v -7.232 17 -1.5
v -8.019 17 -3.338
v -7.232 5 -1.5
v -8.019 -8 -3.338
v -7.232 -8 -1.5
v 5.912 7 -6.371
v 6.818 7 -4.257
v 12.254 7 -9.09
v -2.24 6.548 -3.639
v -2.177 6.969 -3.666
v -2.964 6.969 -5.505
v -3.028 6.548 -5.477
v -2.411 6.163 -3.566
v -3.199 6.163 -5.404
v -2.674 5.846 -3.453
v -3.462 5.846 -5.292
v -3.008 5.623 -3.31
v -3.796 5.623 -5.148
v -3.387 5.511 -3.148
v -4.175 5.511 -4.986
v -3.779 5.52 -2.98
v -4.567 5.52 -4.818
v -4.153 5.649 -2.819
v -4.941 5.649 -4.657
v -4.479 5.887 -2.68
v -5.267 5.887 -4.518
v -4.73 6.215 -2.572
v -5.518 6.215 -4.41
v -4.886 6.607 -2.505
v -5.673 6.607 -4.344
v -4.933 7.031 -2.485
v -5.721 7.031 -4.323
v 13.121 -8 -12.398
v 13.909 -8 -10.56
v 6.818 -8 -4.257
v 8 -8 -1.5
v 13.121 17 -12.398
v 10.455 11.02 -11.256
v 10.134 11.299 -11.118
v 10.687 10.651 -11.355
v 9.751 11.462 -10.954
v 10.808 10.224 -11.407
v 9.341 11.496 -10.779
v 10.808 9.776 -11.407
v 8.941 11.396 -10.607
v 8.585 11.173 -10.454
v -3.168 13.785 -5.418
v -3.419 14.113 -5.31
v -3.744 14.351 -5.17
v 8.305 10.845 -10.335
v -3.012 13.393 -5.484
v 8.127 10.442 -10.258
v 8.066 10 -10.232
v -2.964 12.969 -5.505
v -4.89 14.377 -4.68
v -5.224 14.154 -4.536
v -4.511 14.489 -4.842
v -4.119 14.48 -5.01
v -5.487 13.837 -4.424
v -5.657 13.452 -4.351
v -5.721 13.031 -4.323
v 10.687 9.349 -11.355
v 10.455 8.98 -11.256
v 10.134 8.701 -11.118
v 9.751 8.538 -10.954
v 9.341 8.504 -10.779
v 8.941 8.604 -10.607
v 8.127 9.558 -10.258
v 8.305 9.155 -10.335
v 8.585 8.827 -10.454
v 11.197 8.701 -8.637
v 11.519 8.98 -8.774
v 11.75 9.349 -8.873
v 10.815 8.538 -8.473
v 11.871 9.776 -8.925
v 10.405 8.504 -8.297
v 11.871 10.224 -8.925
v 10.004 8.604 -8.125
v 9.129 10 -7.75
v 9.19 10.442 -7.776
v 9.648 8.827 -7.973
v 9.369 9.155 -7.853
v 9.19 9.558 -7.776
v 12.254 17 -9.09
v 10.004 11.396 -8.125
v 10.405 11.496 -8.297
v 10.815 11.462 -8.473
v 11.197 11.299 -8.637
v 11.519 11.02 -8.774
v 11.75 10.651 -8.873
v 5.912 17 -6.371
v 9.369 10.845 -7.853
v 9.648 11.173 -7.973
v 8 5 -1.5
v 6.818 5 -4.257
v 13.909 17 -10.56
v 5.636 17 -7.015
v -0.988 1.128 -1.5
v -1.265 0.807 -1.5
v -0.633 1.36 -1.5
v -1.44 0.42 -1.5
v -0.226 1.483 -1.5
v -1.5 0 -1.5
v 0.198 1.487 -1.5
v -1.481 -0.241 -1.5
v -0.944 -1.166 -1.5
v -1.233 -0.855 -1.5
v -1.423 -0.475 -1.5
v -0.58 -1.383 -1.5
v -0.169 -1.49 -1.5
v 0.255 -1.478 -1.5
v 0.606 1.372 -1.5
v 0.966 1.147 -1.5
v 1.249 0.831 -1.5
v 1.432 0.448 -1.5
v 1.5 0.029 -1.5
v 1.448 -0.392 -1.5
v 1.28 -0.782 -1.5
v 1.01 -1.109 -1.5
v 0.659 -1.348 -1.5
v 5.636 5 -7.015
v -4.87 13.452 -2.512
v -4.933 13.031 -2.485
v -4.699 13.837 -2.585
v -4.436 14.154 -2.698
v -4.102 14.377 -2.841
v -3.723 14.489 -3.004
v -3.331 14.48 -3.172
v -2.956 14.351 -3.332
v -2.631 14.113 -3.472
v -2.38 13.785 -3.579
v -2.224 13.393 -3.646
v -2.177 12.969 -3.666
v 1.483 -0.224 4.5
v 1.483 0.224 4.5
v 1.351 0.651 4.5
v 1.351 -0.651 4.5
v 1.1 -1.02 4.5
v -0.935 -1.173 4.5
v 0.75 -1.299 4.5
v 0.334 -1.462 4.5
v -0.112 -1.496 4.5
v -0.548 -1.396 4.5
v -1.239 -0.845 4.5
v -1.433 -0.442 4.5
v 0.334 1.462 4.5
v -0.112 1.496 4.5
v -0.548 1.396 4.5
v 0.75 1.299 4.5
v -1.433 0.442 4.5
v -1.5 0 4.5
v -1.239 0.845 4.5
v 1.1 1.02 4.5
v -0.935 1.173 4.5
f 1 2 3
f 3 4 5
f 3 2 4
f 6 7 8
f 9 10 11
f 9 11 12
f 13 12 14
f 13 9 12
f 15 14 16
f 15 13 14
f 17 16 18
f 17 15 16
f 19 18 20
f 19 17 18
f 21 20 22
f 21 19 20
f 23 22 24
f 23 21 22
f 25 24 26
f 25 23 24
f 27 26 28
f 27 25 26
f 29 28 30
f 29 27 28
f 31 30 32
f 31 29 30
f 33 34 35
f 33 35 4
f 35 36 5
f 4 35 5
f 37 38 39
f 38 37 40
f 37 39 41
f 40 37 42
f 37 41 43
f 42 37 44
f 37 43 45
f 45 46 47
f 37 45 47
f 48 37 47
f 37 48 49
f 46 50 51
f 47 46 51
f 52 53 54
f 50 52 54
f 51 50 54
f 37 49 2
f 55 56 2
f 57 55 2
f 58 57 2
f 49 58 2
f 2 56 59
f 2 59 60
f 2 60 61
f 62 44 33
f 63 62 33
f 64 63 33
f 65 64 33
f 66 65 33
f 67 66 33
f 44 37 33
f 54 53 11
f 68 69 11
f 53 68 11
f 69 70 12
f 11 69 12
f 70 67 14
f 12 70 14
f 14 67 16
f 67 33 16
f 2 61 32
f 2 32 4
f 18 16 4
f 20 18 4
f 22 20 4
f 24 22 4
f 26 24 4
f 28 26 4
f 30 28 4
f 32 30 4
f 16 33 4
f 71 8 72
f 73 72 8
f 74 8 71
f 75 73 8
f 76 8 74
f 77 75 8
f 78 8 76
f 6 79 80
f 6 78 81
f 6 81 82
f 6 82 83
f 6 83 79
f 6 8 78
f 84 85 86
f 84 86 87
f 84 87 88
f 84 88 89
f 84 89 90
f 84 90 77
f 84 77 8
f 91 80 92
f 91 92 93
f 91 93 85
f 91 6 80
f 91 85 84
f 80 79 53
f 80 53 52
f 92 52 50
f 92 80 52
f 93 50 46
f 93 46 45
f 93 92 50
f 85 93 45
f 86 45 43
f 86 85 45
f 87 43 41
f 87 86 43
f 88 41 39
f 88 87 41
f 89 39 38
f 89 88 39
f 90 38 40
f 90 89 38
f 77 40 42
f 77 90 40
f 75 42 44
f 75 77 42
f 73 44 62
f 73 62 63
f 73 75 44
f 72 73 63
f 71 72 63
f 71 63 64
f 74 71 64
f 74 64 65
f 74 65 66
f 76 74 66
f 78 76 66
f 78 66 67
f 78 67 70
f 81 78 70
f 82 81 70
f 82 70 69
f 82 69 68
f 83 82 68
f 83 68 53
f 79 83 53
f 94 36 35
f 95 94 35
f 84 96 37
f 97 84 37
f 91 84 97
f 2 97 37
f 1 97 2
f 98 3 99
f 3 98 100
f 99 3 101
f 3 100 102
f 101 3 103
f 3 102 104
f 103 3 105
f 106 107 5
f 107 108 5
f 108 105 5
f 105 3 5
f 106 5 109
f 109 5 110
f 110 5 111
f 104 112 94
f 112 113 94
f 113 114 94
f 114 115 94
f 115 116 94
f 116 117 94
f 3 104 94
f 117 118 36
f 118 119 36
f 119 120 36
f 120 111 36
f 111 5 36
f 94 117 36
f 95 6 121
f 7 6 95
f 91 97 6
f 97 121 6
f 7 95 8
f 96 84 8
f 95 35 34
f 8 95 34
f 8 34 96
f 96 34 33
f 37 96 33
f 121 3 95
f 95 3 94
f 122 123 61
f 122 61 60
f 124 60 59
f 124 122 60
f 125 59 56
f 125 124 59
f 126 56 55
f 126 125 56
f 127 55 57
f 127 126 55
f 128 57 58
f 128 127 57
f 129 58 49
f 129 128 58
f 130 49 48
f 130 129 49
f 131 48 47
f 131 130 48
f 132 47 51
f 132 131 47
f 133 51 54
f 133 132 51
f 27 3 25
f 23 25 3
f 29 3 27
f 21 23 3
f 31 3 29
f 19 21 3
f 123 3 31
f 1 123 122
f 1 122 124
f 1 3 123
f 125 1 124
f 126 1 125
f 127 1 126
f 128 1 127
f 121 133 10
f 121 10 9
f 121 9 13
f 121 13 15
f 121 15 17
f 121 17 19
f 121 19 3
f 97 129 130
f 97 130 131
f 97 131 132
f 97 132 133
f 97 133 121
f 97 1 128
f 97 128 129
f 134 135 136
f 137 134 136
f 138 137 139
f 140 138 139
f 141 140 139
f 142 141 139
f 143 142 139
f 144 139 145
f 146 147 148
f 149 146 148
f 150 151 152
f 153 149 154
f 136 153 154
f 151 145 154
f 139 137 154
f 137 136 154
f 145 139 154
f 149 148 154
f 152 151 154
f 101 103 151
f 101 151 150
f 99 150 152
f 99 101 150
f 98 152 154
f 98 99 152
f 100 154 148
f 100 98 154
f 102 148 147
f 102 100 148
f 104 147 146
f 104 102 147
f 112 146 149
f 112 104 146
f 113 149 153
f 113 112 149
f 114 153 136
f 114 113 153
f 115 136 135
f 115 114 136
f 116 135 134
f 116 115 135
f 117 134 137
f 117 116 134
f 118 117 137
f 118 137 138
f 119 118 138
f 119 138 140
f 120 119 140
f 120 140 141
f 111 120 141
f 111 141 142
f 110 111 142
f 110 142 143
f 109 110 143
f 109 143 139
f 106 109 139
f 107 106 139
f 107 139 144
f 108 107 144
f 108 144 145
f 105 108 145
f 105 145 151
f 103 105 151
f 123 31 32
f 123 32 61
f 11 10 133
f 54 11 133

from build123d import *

# Parameters (mm, degrees)
PAD_DEPTH                      = 25
POCKET_DEPTH                   = 12
SKETCH002_R                    = 1.5
PAD001_DEPTH                   = 6
POCKET001_DEPTH                = 2.001
SKETCH004_W                    = 2.3
SKETCH004_H                    = 10
POCKET002_DEPTH                = 9.001
SKETCH005_R                    = 1.5
HOLE_DEPTH                     = 2.701
PART_MIRRORING_PLACEMENT_ANGLE = 23.19859


with BuildPart() as body:
    # Sketch → Pad (new body)
    with BuildSketch(Plane.XZ):
        Polygon((0, 0), (0, 2), (14, 8), (14, 5), (23, 2), (23, 0), align=None)
    extrude(amount=PAD_DEPTH)

    # Sketch001 (on Face8 of Pad) → Pocket (cut)
    with BuildSketch(Plane.XZ.offset(25)):
        Polygon((0, 2), (14, 2), (14, 8), align=None)
    extrude(amount=-POCKET_DEPTH, mode=Mode.SUBTRACT)

    # Sketch002 (on Face3 of Pocket) → Pad001 (join)
    with BuildSketch(Plane(origin=(-0.724138, 0, 1.689655), x_dir=(-0.919145, 0, -0.393919), z_dir=(-0.393919, 0, 0.919145))):
        with Locations((-8.019385, 8)):
            Circle(SKETCH002_R)
    extrude(amount=PAD001_DEPTH)

    # Sketch003 (on Face4 of Pad001) → Pocket001 (cut, through all)
    with BuildSketch(Plane(origin=(0, 0, 2), x_dir=(-1, 0, 0), z_dir=(0, 0, 1))):
        with BuildLine():
            ThreePointArc((-2.500319, 21.030919), (-4.030919, 22.499681), (-5.499681, 20.969081))
            Line((-5.499681, 14.969081), (-5.499681, 20.969081))
            ThreePointArc((-5.499681, 14.969081), (-3.969081, 13.500319), (-2.500319, 15.030919))
            Line((-2.500319, 15.030919), (-2.500319, 21.030919))
        make_face()
    extrude(amount=-POCKET001_DEPTH, mode=Mode.SUBTRACT)

    # Sketch004 (on Face15 of Pocket001) → Pocket002 (cut, through all)
    with BuildSketch(Plane(origin=(14, 0, 0), x_dir=(0, 0, -1), z_dir=(-1, 0, 0))):
        with Locations((-3.85, 20)):
            Rectangle(SKETCH004_W, SKETCH004_H)
    extrude(amount=-POCKET002_DEPTH, mode=Mode.SUBTRACT)

    # Sketch005 (on Face17 of Pocket002) → Hole (cut, through all)
    with BuildSketch(Plane(origin=(0, 0, 2.7), x_dir=(-1, 0, 0), z_dir=(0, 0, 1))):
        with Locations((-19, 18)):
            Circle(SKETCH005_R)
    extrude(amount=-HOLE_DEPTH, mode=Mode.SUBTRACT)


with BuildPart() as part_mirroring:
    # Part__Mirroring: instance of Body
    add(body.part.mirror(Plane(origin=(0, 0, 0), x_dir=(1, 0, 0), z_dir=(0, 1, 0))))


with BuildPart() as part_mirroring_1:
    # Part__Mirroring placement: moved
    add(part_mirroring.part.moved(Location((-8.019385, -8, -3.338294))).rotate(Axis((-8.019385, -8, -3.338294), (0, 1, 0)), PART_MIRRORING_PLACEMENT_ANGLE))


solid = part_mirroring_1.part
